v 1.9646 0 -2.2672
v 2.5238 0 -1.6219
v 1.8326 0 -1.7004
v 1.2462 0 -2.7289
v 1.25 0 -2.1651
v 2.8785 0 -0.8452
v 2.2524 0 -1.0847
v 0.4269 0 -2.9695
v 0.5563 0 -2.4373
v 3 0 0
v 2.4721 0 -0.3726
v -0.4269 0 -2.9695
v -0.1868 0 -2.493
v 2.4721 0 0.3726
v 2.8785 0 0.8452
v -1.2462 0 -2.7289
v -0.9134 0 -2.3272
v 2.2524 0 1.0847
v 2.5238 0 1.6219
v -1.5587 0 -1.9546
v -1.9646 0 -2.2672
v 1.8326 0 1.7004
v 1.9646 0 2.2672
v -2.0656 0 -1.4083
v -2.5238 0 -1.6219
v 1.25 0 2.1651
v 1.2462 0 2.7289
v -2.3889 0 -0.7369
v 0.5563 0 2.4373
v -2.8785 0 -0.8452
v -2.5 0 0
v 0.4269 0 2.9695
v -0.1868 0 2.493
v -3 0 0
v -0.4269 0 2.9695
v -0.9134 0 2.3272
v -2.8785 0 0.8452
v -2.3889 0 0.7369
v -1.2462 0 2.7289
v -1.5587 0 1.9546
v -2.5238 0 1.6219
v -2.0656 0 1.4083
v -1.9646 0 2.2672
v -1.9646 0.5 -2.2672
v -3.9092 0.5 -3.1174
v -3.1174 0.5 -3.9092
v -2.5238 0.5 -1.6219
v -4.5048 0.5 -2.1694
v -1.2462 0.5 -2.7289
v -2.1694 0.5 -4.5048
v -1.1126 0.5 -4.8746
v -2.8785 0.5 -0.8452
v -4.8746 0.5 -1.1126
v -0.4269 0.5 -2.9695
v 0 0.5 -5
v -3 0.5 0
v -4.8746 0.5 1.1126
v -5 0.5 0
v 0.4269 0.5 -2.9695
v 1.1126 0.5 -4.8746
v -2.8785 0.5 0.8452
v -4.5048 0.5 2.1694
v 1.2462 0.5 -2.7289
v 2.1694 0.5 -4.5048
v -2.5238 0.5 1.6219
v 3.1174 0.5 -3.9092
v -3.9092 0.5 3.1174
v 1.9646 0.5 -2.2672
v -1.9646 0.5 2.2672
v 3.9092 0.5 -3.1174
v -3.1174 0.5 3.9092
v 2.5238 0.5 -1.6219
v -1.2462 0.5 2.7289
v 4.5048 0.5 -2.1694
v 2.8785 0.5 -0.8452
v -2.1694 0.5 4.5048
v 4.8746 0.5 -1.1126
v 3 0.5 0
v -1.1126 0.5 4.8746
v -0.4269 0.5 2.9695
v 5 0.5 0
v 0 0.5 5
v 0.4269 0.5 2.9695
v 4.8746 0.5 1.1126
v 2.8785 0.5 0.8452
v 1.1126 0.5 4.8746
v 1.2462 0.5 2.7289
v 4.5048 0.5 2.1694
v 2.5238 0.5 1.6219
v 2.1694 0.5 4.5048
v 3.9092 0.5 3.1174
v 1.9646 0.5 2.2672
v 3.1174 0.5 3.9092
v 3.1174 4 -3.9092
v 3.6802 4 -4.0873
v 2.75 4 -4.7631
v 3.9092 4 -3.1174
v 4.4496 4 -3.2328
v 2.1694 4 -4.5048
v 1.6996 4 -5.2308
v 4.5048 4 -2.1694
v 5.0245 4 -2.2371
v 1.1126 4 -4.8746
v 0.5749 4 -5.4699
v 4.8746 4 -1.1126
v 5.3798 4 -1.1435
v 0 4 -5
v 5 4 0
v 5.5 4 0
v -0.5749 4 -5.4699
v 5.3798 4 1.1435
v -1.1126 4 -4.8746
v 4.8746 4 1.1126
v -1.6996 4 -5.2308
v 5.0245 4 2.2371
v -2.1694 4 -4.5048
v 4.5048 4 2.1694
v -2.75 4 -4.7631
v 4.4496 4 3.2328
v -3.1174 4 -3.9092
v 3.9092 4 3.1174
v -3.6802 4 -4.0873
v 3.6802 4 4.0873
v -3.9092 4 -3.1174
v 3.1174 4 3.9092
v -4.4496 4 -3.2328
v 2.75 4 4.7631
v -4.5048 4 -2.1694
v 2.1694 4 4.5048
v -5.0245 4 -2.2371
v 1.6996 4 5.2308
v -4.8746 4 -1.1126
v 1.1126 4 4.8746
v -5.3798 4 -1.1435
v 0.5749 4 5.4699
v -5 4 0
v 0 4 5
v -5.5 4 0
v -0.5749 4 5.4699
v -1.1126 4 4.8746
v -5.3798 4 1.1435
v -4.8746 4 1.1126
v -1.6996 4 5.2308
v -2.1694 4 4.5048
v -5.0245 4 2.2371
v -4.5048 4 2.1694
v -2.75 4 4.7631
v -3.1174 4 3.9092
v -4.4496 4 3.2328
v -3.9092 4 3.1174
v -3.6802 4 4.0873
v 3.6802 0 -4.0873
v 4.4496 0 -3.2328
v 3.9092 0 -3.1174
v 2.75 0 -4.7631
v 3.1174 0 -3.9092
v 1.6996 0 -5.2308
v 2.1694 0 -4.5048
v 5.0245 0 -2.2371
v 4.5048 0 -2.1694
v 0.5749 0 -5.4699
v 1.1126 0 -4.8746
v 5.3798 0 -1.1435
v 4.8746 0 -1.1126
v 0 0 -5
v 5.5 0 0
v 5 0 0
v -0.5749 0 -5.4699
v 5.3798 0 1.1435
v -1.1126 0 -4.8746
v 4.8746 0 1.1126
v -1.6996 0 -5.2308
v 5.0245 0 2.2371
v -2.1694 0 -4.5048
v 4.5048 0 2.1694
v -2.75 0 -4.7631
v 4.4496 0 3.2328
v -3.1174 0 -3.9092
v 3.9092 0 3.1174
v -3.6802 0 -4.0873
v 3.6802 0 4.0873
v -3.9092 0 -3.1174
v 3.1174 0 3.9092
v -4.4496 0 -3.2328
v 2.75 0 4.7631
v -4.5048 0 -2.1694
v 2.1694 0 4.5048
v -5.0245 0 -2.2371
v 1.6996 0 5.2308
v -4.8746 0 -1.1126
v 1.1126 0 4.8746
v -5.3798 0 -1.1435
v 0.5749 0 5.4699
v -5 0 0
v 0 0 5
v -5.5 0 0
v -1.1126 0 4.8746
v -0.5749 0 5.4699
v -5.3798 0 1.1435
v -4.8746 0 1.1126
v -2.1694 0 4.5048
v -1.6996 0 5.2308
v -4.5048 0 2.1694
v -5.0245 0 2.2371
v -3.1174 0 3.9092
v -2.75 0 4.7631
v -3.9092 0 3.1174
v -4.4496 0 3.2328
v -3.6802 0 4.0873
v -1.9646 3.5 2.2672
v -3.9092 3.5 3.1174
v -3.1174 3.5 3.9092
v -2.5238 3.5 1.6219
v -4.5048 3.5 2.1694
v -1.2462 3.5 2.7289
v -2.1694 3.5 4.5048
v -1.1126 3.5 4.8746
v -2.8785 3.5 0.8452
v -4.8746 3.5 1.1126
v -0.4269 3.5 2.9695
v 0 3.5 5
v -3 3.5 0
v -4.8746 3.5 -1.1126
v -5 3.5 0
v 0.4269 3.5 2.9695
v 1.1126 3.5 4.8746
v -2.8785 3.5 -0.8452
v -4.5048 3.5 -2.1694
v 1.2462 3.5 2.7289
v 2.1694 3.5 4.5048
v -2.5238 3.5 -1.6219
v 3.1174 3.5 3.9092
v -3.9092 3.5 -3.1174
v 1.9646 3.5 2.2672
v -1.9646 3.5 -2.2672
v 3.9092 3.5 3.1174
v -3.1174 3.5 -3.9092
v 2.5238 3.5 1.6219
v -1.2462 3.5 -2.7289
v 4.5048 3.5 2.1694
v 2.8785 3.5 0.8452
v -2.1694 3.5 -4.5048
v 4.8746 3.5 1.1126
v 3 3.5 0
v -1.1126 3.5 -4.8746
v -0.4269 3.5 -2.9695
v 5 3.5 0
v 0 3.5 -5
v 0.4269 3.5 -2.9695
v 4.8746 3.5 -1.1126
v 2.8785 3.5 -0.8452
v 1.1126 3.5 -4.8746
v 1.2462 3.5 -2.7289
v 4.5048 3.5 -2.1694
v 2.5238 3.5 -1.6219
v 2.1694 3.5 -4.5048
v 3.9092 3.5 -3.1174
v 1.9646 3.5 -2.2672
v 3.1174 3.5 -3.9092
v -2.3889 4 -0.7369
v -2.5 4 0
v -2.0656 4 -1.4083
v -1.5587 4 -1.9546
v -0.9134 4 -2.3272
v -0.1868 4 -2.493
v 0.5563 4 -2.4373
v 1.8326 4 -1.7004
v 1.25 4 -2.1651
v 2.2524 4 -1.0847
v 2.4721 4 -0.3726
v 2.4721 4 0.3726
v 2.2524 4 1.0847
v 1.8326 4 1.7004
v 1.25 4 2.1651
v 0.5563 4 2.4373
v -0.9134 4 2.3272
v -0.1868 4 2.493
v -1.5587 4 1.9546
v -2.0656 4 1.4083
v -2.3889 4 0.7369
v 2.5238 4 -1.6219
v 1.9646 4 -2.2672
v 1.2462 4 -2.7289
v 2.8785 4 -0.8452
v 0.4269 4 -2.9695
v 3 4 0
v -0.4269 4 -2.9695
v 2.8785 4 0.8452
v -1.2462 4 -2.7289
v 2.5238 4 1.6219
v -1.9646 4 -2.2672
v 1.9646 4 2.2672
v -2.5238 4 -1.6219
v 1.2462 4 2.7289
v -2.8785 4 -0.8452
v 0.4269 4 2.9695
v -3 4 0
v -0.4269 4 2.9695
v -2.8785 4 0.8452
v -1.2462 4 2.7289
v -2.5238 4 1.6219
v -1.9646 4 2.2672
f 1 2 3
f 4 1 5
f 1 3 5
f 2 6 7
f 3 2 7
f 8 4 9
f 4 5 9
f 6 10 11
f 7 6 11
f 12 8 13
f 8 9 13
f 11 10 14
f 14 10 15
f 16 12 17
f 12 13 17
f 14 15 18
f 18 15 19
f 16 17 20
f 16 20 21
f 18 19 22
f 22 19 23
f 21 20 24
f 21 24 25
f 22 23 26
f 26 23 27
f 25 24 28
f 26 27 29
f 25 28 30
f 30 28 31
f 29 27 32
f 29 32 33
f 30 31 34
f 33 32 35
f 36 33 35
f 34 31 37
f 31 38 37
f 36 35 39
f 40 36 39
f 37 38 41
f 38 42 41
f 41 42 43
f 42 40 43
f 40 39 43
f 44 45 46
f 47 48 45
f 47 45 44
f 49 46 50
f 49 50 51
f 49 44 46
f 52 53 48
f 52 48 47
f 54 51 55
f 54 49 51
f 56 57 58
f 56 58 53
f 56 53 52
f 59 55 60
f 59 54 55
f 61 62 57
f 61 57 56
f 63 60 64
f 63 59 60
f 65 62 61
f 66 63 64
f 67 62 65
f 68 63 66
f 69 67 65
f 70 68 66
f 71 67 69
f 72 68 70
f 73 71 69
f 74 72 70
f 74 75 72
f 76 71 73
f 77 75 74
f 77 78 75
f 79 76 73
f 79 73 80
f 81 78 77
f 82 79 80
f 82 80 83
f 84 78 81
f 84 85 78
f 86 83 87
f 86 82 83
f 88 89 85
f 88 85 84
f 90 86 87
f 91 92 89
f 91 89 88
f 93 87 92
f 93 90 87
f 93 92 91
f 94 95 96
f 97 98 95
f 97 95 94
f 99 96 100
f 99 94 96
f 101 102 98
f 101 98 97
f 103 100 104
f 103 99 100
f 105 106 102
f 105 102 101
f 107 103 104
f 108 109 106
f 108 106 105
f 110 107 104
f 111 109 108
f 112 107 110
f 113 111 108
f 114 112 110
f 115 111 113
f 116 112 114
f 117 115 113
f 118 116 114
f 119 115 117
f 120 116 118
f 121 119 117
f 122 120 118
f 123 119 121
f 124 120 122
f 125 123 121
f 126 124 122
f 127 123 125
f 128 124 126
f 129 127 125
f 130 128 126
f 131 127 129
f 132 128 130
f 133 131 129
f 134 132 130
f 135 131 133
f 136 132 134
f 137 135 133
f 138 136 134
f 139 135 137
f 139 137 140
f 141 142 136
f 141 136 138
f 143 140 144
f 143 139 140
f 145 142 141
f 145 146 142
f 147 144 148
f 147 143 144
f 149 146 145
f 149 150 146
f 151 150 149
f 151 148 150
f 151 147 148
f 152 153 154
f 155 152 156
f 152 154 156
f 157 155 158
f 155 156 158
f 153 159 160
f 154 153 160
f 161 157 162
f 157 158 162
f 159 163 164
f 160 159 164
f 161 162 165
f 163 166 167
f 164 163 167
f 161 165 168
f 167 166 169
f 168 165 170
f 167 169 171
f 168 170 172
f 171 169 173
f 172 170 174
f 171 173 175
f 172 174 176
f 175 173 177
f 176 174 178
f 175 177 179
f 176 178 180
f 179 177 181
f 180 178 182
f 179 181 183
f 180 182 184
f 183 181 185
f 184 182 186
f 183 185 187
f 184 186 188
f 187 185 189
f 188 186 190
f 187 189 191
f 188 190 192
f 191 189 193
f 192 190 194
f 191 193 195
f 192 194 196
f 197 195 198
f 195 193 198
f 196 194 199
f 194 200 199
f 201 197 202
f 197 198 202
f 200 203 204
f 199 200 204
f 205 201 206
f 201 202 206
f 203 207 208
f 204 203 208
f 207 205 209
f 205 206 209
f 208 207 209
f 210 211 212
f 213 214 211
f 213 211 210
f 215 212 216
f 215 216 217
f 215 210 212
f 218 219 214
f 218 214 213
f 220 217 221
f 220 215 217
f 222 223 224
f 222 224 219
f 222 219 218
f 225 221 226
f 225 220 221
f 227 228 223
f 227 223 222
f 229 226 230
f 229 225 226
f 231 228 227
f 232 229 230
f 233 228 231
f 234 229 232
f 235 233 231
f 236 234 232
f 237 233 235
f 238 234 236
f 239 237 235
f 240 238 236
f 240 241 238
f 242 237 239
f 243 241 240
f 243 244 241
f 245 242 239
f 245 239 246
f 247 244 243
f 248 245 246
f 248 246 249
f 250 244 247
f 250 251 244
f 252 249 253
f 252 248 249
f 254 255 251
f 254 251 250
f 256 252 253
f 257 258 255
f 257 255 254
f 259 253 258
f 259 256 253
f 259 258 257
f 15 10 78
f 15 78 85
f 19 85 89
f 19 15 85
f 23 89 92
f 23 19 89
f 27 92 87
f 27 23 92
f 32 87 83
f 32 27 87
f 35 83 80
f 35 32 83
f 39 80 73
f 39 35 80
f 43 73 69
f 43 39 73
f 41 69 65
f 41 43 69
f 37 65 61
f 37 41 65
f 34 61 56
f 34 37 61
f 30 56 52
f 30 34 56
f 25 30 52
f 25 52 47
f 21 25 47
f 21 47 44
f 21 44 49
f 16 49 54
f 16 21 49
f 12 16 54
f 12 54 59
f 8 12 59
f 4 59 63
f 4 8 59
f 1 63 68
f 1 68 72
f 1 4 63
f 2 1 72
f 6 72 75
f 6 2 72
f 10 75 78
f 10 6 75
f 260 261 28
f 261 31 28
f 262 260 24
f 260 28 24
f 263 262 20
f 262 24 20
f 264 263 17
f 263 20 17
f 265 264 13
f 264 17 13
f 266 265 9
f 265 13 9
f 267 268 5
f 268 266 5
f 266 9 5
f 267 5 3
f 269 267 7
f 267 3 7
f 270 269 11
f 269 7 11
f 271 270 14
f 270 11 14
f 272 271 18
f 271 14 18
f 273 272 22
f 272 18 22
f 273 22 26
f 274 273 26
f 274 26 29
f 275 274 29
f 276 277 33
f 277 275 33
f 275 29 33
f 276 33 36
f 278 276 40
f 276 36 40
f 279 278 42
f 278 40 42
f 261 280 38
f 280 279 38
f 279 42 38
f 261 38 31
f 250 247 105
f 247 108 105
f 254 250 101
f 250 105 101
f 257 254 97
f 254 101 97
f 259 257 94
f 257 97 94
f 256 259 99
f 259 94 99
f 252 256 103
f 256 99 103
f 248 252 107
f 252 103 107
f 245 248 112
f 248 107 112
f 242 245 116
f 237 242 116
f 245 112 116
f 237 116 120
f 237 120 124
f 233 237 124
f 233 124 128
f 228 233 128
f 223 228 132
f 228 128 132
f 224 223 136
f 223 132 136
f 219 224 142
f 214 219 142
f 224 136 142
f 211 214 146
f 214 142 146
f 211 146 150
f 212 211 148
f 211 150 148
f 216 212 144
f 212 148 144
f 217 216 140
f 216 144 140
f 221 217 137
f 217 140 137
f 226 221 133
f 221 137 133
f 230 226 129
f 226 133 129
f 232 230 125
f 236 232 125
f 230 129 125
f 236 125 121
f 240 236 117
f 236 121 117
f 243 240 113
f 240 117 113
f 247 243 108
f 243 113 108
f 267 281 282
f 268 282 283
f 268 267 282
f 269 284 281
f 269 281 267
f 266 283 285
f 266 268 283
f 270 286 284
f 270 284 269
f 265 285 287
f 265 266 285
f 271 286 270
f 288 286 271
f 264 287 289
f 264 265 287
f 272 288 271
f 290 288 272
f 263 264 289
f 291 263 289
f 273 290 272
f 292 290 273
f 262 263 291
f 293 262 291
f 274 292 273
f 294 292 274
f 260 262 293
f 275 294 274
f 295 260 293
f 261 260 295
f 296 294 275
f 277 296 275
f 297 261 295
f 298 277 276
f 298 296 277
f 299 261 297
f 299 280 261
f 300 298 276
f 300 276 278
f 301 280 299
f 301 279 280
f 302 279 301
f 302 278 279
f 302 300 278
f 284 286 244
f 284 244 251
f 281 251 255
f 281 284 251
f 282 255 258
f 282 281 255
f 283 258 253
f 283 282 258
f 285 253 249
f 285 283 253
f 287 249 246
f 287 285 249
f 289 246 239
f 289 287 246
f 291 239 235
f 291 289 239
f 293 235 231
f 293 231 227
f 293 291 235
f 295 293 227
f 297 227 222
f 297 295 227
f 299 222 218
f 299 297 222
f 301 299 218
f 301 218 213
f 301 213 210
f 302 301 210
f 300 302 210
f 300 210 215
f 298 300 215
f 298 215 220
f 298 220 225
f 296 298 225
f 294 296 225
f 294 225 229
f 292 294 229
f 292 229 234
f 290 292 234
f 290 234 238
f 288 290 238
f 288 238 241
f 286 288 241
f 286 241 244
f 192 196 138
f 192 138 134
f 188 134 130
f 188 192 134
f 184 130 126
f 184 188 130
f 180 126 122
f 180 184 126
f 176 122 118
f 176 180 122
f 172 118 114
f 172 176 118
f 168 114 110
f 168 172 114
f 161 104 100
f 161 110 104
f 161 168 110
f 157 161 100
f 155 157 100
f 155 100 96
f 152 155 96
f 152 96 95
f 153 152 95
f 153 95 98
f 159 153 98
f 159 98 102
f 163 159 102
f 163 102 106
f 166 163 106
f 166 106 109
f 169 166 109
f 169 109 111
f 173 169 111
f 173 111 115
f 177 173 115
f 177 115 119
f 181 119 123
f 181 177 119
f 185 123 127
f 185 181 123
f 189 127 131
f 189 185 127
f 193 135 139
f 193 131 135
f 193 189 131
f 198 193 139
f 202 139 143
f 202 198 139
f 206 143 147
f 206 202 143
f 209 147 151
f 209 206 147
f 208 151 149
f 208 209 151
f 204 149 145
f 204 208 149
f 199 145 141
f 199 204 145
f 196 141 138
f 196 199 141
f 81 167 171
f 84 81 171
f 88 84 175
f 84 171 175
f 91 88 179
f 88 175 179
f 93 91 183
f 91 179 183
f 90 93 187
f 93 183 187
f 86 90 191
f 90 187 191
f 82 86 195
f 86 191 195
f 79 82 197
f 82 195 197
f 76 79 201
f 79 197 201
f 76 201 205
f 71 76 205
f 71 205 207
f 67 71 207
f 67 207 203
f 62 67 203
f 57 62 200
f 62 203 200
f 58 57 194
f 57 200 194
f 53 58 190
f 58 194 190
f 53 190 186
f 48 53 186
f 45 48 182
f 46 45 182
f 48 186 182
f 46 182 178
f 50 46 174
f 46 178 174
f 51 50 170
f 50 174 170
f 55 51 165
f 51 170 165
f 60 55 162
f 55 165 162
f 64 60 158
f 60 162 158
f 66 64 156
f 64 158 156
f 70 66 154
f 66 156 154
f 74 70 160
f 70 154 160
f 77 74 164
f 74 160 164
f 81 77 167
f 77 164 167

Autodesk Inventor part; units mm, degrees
ref_plane "YZ Plane" through (0, 0, 0) normal (1, 0, 0) x (0, 1, 0)
ref_plane "XZ Plane" through (0, 0, 0) normal (0, 1, 0) x (-1, 0, 0)
ref_plane "XY Plane" through (0, 0, 0) normal (0, 0, 1) x (1, 0, 0)
sketch "Sketch1" plane through (0, 0, 0) normal (0, 1, 0) x (-1, 0, 0)
  circle A0 centre (0, 0) radius 5.5
  circle A1 centre (0, 0) radius 2.5
  dimension "d0" = 11
  dimension "d1" = 5
extrude "Extrusion1" add sketch "Sketch1" along normal blind 4
sketch "Sketch2" plane through (0, 4, 0) normal (0, 1, 0) x (1, 0, 0)
  circle A0 centre (0, 0) radius 5.5 projected
  circle A1 centre (0, 0) radius 2.5 projected
  circle A2 centre (0, 0) radius 3
  circle A3 centre (0, 0) radius 5
  dimension "d4" = 0.5
  dimension "d5" = 0.5
extrude "Extrusion2" cut sketch "Sketch2" against normal blind 0.5 contours A3
sketch "Sketch3" plane through (0, 0, 0) normal (0, -1, 0) x (1, 0, 0)
  circle A0 centre (0, 0) radius 5.5 projected
  circle A1 centre (0, 0) radius 2.5 projected
  circle A2 centre (0, 0) radius 5 projected
  circle A3 centre (0, 0) radius 3 projected
extrude "Extrusion3" cut sketch "Sketch3" against normal blind 0.5 contours A2
properties part number "Bearing_5x11x4"
